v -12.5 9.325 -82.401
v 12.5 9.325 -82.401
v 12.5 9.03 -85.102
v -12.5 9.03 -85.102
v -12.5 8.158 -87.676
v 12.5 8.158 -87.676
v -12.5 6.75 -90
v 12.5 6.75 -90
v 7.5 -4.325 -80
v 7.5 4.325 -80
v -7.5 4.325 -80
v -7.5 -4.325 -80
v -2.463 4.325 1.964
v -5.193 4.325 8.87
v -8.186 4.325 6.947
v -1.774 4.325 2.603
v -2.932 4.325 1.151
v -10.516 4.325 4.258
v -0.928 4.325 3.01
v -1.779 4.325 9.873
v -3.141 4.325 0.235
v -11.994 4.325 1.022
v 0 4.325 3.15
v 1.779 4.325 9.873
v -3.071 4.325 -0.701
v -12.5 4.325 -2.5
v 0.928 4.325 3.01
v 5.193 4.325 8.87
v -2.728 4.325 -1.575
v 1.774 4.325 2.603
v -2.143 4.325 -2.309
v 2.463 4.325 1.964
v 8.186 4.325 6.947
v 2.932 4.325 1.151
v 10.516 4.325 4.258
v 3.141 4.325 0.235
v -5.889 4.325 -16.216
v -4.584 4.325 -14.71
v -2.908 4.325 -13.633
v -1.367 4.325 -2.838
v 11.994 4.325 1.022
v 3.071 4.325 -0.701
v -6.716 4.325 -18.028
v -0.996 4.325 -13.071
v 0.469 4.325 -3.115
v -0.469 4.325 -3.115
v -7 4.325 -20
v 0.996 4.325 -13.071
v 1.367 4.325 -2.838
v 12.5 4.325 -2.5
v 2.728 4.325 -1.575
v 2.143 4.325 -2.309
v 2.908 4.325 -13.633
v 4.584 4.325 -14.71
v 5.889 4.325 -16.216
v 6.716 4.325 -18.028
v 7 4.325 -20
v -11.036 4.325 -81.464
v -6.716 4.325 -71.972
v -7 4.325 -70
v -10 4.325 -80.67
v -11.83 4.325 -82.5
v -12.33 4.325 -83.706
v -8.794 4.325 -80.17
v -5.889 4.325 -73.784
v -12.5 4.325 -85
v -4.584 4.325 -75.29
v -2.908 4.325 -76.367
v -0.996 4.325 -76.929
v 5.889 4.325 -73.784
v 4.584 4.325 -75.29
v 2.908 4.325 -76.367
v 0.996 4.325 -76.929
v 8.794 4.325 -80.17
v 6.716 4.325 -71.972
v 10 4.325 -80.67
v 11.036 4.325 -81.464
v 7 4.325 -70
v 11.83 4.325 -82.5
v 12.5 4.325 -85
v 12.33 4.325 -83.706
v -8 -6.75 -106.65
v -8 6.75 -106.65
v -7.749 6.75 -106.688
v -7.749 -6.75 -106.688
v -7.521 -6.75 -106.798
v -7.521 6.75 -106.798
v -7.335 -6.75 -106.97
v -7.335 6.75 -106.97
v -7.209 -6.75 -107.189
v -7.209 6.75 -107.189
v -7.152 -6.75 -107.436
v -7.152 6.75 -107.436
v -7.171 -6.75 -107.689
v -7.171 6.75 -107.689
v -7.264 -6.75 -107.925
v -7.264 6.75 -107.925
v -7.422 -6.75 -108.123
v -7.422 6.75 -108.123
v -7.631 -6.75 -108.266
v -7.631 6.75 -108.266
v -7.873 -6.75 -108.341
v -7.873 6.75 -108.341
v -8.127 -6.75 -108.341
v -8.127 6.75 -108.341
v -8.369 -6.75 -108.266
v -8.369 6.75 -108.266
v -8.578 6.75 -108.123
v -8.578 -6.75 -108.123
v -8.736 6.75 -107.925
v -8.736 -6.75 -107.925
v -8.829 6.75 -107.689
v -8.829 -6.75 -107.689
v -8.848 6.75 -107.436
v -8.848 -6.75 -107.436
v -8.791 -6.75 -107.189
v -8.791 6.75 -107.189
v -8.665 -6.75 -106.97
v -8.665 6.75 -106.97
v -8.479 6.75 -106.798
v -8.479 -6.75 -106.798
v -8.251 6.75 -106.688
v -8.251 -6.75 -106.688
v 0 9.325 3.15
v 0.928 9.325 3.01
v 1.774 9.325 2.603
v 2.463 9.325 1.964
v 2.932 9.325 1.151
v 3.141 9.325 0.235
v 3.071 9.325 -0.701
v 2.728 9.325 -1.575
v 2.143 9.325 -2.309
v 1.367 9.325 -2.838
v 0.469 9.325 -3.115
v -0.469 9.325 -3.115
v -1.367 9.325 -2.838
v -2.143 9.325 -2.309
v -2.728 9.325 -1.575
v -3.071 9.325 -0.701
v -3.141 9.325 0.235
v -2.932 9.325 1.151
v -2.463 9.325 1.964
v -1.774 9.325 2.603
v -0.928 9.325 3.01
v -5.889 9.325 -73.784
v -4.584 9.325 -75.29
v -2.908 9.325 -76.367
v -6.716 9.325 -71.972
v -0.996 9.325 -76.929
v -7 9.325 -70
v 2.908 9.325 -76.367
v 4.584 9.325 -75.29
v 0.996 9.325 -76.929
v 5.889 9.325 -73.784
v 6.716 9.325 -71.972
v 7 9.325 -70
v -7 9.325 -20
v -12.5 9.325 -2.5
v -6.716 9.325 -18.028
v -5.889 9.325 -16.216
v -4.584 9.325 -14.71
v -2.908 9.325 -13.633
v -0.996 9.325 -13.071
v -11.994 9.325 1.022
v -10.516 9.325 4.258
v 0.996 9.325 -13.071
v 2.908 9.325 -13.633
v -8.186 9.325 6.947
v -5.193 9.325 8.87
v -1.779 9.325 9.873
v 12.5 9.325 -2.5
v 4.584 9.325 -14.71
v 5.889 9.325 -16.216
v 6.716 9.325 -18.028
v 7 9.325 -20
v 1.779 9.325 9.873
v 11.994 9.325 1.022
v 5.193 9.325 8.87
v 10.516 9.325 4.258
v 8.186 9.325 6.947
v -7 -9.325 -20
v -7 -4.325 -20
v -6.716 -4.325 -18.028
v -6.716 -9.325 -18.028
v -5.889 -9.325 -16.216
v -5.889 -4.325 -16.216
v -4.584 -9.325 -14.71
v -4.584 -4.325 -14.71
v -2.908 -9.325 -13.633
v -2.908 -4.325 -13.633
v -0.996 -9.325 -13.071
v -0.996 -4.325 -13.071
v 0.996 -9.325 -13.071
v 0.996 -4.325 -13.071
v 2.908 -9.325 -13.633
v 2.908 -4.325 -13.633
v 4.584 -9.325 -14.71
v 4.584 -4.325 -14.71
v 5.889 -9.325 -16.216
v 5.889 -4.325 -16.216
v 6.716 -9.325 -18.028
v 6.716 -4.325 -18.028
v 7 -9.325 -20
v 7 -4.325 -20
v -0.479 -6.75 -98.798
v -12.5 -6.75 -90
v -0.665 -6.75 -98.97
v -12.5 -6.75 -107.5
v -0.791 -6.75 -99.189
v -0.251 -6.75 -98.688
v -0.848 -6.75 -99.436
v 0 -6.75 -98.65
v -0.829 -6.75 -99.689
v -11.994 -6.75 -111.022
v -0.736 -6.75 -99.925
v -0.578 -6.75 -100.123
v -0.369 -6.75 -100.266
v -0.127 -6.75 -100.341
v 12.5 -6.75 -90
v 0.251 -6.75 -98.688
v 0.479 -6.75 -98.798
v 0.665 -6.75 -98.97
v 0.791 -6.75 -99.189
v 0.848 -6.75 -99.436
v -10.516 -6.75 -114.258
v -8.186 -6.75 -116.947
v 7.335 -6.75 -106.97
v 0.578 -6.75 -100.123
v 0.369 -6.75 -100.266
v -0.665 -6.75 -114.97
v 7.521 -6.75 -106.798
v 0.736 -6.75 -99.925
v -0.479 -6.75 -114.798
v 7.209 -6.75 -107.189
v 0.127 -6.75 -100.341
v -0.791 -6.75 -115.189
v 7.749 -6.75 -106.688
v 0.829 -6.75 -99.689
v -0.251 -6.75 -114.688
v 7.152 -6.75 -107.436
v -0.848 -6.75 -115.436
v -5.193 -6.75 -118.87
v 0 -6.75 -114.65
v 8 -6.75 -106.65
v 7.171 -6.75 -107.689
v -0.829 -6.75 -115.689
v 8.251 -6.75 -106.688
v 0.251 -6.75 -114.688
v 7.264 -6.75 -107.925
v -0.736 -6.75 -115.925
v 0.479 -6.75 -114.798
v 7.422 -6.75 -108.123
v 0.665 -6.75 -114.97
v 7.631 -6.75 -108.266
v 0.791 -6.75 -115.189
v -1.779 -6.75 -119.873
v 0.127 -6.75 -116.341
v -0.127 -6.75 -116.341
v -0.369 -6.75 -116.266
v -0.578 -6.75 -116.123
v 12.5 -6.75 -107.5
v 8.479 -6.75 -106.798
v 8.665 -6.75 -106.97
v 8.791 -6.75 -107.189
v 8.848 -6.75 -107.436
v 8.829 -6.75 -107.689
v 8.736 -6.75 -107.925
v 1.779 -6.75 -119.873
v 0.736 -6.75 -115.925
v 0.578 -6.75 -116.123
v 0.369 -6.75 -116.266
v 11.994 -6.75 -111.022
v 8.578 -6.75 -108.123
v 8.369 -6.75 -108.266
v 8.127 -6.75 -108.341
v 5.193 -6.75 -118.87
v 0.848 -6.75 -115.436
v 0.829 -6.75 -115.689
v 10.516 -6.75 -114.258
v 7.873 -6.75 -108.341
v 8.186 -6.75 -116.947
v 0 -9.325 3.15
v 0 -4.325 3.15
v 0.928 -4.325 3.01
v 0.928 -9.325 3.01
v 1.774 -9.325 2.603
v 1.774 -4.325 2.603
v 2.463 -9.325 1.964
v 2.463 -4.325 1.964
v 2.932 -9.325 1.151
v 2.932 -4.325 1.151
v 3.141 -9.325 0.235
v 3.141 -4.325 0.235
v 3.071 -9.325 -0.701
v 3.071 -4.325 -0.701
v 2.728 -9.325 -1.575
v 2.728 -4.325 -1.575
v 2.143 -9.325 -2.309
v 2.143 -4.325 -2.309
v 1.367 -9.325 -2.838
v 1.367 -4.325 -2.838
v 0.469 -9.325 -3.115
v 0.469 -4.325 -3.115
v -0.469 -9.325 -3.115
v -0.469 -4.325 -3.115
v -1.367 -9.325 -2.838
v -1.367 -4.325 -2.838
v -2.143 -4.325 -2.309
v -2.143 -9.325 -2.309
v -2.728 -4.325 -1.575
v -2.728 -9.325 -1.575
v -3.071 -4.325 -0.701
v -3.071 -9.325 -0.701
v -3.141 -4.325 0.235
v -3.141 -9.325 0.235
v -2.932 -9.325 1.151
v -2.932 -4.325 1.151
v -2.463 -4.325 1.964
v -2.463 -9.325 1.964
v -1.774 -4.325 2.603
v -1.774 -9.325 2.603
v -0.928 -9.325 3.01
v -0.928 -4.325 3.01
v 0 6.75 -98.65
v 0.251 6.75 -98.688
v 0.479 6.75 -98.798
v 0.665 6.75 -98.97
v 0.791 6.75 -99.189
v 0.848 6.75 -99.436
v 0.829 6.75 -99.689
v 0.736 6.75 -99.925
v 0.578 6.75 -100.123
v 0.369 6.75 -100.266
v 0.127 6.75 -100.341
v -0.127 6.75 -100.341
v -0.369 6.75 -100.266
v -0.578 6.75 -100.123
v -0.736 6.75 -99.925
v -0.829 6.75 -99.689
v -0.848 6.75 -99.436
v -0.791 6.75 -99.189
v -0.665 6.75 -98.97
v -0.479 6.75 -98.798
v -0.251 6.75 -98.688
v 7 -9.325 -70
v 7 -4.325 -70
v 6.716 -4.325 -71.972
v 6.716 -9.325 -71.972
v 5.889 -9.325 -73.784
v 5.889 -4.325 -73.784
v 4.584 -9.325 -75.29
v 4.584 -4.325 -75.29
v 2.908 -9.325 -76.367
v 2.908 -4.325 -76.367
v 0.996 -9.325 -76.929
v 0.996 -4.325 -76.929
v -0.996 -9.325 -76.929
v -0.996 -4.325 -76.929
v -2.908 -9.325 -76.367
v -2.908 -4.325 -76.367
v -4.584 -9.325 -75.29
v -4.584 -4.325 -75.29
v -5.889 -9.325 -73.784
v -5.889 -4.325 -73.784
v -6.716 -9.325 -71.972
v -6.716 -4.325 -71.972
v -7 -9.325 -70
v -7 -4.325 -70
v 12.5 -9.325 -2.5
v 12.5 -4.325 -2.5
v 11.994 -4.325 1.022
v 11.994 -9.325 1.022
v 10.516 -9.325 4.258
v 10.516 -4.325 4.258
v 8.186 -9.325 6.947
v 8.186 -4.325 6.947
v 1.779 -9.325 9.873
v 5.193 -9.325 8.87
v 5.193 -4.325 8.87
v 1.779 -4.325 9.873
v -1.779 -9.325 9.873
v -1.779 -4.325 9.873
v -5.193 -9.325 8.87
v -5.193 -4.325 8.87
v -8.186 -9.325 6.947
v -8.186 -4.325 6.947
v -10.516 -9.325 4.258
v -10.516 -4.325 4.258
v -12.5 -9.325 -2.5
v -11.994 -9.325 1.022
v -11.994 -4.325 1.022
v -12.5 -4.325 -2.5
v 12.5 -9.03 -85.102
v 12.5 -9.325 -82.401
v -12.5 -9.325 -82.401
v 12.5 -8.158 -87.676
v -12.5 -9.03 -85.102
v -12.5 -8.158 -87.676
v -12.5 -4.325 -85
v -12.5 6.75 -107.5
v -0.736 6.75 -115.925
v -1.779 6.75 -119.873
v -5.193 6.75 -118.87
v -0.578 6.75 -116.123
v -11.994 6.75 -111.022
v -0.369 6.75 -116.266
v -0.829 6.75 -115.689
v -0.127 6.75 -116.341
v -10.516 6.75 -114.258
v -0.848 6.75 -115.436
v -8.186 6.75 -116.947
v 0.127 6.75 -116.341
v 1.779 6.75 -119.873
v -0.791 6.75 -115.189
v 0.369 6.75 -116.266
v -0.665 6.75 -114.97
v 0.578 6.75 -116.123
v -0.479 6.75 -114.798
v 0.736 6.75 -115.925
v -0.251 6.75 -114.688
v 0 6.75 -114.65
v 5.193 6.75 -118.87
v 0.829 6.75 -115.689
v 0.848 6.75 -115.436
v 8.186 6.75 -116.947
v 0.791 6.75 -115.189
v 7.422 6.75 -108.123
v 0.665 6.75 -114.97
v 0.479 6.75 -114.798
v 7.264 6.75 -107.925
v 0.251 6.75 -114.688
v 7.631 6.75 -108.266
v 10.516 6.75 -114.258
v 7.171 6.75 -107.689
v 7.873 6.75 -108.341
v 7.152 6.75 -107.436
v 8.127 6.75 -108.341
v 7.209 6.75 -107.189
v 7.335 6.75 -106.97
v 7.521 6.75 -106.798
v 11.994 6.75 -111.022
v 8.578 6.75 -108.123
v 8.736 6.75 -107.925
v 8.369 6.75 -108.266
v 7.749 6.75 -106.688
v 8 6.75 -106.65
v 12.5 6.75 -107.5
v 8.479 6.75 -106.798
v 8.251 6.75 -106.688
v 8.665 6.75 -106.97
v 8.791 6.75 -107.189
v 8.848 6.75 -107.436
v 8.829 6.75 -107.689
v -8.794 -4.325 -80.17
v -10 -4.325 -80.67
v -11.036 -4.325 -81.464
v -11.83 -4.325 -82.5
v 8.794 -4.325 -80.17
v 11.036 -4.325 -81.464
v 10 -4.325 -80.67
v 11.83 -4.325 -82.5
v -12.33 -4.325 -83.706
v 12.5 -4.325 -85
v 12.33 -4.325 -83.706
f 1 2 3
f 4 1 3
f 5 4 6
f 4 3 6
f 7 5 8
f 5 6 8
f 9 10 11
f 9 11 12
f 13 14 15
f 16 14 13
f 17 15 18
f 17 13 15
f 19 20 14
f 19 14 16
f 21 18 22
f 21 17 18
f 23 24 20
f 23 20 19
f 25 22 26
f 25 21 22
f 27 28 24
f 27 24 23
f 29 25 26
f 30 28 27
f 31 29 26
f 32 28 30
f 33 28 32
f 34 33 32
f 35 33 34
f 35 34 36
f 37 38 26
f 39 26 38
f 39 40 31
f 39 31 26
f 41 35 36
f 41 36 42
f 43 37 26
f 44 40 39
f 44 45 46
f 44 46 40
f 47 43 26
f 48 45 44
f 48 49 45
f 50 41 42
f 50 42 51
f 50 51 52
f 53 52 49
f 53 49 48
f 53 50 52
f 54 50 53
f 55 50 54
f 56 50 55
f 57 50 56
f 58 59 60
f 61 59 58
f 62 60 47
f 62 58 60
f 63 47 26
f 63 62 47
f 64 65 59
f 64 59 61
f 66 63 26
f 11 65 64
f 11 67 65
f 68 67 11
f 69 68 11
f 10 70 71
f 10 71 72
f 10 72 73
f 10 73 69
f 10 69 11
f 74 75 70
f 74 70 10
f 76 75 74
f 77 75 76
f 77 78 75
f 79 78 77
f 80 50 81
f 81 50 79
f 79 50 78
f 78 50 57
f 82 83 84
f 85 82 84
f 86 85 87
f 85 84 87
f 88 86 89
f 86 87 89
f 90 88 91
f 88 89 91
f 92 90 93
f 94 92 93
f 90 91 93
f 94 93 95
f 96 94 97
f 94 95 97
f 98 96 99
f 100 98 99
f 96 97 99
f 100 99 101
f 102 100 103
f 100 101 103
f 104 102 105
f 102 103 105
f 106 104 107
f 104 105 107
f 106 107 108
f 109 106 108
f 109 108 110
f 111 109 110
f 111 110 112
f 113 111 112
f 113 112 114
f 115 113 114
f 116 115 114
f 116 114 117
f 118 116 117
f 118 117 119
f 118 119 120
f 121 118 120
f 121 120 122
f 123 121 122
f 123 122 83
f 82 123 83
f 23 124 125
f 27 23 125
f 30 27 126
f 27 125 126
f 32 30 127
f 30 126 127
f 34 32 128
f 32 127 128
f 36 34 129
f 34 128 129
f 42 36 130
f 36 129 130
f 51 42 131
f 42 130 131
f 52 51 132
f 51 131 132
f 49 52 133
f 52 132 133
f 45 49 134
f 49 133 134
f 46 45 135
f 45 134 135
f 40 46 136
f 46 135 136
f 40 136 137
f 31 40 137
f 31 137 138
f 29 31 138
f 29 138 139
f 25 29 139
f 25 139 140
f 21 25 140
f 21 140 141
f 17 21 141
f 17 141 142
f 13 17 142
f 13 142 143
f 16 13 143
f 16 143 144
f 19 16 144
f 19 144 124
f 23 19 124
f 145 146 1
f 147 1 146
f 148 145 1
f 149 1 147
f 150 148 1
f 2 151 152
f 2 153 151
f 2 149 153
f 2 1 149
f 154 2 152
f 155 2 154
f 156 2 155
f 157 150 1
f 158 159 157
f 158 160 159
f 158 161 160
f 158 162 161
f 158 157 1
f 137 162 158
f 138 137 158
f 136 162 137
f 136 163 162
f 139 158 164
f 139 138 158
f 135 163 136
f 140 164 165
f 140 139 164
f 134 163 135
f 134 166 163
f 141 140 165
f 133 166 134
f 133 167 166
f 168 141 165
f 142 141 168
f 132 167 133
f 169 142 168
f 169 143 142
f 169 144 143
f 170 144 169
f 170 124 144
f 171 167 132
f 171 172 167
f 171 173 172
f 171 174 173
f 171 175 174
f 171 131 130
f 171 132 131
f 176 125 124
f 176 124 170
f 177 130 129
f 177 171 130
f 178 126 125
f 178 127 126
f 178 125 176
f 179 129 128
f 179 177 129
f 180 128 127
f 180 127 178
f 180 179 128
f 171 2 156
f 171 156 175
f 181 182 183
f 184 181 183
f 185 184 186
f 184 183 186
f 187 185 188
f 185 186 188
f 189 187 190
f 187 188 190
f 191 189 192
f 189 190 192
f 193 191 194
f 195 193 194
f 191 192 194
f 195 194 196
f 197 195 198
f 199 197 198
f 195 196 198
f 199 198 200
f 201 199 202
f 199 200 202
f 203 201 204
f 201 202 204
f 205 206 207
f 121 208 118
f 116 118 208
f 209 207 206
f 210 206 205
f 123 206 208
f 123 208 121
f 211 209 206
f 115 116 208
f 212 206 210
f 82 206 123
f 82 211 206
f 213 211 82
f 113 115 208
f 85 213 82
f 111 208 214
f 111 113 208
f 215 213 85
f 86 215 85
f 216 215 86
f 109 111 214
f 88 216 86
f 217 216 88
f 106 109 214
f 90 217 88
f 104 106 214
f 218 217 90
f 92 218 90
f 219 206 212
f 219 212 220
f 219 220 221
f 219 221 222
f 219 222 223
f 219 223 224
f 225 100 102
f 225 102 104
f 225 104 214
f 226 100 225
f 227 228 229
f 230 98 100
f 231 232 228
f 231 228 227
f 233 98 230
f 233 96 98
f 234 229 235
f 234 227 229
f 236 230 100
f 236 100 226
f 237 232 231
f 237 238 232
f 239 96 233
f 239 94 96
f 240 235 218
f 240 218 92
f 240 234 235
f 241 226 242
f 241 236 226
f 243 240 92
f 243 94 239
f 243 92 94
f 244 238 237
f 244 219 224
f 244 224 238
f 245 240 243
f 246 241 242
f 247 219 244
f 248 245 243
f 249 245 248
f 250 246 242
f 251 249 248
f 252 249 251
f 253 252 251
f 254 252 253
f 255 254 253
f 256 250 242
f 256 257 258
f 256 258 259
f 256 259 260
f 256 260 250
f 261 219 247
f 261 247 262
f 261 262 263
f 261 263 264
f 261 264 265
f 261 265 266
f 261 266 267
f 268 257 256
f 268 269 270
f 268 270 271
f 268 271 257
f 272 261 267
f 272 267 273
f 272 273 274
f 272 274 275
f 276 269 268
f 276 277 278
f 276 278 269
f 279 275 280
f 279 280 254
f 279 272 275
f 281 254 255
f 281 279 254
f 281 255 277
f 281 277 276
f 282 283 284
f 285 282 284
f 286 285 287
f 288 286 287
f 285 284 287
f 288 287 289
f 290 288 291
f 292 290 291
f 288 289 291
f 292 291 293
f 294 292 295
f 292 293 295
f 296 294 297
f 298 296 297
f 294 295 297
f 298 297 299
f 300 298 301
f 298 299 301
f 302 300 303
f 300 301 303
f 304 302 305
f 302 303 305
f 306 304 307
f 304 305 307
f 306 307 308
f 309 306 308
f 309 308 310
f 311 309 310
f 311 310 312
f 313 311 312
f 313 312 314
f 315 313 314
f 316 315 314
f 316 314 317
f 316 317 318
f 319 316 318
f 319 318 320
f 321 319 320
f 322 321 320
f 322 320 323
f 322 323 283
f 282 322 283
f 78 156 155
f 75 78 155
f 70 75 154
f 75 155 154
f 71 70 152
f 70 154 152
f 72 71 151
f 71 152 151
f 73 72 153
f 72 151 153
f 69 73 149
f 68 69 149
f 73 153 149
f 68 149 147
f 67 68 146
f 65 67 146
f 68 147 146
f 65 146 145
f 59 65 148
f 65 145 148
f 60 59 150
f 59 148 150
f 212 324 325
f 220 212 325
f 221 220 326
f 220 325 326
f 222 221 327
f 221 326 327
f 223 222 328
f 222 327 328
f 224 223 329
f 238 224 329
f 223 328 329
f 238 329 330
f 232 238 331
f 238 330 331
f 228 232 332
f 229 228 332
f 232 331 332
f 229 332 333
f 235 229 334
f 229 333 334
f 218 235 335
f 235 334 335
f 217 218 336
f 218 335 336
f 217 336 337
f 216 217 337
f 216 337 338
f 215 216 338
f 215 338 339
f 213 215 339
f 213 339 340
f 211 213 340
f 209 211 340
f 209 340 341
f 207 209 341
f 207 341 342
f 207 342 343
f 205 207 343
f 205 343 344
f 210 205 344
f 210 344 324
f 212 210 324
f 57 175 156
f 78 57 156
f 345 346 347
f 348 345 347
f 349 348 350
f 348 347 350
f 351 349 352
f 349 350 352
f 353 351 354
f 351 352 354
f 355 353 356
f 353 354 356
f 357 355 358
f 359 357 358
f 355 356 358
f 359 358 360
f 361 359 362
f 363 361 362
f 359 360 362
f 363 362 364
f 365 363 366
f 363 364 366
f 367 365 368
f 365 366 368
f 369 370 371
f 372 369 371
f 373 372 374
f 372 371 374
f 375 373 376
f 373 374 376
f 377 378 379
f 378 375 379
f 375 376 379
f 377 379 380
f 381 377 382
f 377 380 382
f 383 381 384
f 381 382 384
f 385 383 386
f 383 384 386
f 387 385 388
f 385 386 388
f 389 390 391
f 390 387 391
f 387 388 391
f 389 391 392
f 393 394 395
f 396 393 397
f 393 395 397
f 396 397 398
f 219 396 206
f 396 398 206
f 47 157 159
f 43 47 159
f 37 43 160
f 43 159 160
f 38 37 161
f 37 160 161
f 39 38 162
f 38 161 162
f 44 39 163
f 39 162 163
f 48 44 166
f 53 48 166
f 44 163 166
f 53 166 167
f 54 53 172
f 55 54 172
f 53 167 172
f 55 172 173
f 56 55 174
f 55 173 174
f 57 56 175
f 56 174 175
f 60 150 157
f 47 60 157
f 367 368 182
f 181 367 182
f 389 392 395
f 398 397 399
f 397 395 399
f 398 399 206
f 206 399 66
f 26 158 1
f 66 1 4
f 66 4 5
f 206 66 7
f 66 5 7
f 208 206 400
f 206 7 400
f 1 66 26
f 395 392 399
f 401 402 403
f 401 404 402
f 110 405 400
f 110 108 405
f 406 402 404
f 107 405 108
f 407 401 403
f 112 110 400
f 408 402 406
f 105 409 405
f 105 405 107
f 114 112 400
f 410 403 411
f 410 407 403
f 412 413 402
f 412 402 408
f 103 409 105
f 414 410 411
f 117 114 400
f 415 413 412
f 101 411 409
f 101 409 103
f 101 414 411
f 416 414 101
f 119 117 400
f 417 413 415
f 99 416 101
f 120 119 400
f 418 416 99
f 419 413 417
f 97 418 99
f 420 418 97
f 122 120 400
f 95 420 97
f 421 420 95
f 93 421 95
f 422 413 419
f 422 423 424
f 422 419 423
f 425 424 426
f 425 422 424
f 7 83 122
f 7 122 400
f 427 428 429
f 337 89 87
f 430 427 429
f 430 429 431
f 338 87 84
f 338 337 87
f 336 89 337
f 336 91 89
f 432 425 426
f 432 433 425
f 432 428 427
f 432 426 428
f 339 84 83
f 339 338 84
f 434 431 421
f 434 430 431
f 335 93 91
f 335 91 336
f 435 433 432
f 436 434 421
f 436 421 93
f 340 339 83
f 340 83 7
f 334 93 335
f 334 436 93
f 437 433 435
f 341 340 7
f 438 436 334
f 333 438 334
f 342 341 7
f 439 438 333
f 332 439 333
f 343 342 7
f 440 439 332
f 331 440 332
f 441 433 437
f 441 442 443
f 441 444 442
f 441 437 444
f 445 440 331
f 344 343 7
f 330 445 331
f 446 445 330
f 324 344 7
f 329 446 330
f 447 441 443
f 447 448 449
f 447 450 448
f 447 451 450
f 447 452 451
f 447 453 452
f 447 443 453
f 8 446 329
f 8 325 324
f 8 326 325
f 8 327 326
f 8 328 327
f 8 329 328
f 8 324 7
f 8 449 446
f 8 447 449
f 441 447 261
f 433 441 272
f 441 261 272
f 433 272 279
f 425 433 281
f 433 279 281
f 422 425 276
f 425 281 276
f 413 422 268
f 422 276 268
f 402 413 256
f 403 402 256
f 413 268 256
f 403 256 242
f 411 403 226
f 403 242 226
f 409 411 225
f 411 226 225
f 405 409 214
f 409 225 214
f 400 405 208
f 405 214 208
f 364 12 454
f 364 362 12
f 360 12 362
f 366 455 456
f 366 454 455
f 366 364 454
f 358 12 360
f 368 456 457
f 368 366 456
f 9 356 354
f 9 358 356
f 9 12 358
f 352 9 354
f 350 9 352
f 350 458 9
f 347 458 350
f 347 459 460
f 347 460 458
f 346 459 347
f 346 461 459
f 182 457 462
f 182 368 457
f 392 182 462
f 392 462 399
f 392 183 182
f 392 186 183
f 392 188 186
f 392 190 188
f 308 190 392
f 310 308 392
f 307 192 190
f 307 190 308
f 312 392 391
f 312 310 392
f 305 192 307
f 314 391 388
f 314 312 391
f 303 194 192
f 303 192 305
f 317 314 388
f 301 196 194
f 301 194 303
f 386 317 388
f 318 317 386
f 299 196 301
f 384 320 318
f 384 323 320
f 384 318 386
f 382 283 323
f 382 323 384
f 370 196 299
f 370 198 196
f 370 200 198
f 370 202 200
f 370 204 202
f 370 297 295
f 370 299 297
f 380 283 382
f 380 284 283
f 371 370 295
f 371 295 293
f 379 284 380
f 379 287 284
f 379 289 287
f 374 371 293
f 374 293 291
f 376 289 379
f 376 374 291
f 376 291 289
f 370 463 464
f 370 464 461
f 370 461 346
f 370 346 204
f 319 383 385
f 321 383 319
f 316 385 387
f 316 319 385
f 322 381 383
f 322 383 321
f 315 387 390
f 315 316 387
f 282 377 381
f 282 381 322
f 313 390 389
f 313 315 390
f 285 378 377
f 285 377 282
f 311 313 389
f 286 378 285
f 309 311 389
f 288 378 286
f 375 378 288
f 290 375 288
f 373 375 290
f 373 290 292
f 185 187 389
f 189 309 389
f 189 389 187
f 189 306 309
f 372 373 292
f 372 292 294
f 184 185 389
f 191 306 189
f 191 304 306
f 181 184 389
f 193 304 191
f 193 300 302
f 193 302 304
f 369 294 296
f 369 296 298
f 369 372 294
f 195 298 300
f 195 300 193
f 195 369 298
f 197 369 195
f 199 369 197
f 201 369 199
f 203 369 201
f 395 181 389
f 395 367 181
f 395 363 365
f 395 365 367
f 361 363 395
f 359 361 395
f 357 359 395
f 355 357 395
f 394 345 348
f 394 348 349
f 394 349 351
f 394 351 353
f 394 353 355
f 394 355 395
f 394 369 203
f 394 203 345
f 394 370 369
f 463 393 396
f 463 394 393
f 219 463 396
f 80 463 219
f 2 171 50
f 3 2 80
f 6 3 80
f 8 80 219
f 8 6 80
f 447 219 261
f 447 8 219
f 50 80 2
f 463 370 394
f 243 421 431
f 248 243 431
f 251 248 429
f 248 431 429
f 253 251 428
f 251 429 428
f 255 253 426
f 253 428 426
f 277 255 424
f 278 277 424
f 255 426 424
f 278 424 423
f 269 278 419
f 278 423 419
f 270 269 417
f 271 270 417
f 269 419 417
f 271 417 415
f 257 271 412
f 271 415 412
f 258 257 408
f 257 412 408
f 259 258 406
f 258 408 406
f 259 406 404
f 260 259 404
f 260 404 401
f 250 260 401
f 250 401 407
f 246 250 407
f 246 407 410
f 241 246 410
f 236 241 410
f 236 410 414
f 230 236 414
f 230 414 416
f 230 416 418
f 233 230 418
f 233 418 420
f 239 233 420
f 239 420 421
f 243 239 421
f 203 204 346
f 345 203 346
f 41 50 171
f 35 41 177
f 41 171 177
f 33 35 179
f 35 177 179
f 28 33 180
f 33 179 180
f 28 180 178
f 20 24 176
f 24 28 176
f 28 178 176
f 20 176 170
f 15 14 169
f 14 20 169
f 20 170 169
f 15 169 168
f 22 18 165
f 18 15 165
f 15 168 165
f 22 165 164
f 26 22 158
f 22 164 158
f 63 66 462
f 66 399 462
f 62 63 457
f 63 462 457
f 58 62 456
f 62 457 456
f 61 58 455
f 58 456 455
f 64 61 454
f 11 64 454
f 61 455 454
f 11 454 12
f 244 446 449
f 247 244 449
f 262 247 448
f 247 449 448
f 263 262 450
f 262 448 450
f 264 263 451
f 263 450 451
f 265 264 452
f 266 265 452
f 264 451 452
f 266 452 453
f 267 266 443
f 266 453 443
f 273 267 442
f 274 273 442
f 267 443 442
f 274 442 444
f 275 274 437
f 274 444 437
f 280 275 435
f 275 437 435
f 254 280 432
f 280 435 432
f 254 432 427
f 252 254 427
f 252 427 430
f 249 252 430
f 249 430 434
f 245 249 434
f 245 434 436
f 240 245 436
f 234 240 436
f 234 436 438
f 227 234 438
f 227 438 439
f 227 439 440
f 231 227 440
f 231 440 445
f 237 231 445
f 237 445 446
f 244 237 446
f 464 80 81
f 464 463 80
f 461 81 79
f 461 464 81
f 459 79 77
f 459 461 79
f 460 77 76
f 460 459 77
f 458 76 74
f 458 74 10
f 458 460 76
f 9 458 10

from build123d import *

# Parameters (mm, degrees)
BOSS_EXTRU_1_DEPTH      = 12.5
CONG_1_R                = 12.5
ESQUISSE2_R             = 0.85
ENL_V_MAT_EXTRU_1_DEPTH = 122.715469949
ESQUISSE3_R             = 3.15
ENL_V_MAT_EXTRU_2_DEPTH = 123.082236628
ENL_V_MAT_EXTRU_3_DEPTH = 123.082236628
CONG_2_R                = 5


with BuildPart() as part:
    # Esquisse1 → Boss.-Extru.1 (new, symmetric)
    with BuildSketch(Plane(origin=(0, 0, 0), x_dir=(0, 0, -1), z_dir=(1, 0, 0))):
        Polygon((90, 9.325), (-10, 9.325), (-10, 4.325), (80, 4.325), (80, -4.325), (-10, -4.325), (-10, -9.325), (90, -9.325), (90, -6.75), (120, -6.75), (120, 6.75), (90, 6.75), align=None)
    extrude(amount=BOSS_EXTRU_1_DEPTH, both=True)

    # Congé1
    # the kernel refuses this fillet: 12.5 mm, written as the material it takes off along each edge
    with BuildSketch(Plane(origin=(-31.497429925, -9.325, -90), x_dir=(0, 1, 0), z_dir=(1, 0, 0))) as cong_1_piece_1:
        with BuildLine():
            CenterArc((12.5, 7.59897197), CONG_1_R, 180, 37.439095089)
            Line((0, 7.59897197), (-0.25, 7.59897197))
            Line((-0.25, 7.59897197), (-0.25, 0))
            Line((-0.25, 0), (0, -0.25))
            ThreePointArc((0, -0.25), (1.2875, -0.25), (2.3765, -0.151979439))
            Line((2.3765, -0.151979439), (2.575, 0))
        make_face()
    extrude(amount=62.99485985, mode=Mode.SUBTRACT)
    with BuildSketch(Plane(origin=(31.497429925, 9.325, -90), x_dir=(0, 0, 1), z_dir=(-1, 0, 0))) as cong_1_piece_2:
        with BuildLine():
            CenterArc((7.59897197, -12.5), CONG_1_R, 90, 37.439095089)
            Line((0, -2.575), (-0.151979439, -2.3765))
            ThreePointArc((-0.151979439, -2.3765), (-0.25, -1.2875), (-0.25, 0))
            Line((-0.25, 0), (0, 0.25))
            Line((0, 0.25), (7.59897197, 0.25))
            Line((7.59897197, 0.25), (7.59897197, 0))
        make_face()
    extrude(amount=62.99485985, mode=Mode.SUBTRACT)
    with BuildSketch(Plane(origin=(-12.5, 26.925, 10), x_dir=(1, 0, 0), z_dir=(0, -1, 0)), Plane(origin=(-12.5, 40.575, 10), x_dir=(1, 0, 0), z_dir=(0, -1, 0)), Plane(origin=(12.5, 40.575, 10), x_dir=(0, 0, -1), z_dir=(0, -1, 0))) as cong_1_piece_3:
        with BuildLine():
            CenterArc((CONG_1_R, -CONG_1_R), CONG_1_R, 90, 90)
            Line((0, -CONG_1_R), (-CONG_1_R * 0.02, -CONG_1_R))
            Line((-CONG_1_R * 0.02, -CONG_1_R), (-CONG_1_R * 0.02, CONG_1_R * 0.02))
            Line((-CONG_1_R * 0.02, CONG_1_R * 0.02), (CONG_1_R, CONG_1_R * 0.02))
            Line((CONG_1_R, CONG_1_R * 0.02), (CONG_1_R, 0))
        make_face()
    extrude(amount=67.5, mode=Mode.SUBTRACT)
    with BuildSketch(Plane(origin=(12.5, 26.925, 10), x_dir=(-1, 0, 0), z_dir=(0, -1, 0))) as cong_1_piece_4:
        with BuildLine():
            CenterArc((CONG_1_R, CONG_1_R), CONG_1_R, 180, 90)
            Line((0, CONG_1_R), (-CONG_1_R * 0.02, CONG_1_R))
            Line((-CONG_1_R * 0.02, CONG_1_R), (-CONG_1_R * 0.02, -CONG_1_R * 0.02))
            Line((-CONG_1_R * 0.02, -CONG_1_R * 0.02), (CONG_1_R, -CONG_1_R * 0.02))
            Line((CONG_1_R, -CONG_1_R * 0.02), (CONG_1_R, 0))
        make_face()
    extrude(amount=67.5, mode=Mode.SUBTRACT)
    with BuildSketch(Plane(origin=(-12.5, -38, -120), x_dir=(1, 0, 0), z_dir=(0, 1, 0))) as cong_1_piece_5:
        with BuildLine():
            CenterArc((CONG_1_R, -CONG_1_R), CONG_1_R, 90, 90)
            Line((0, -CONG_1_R), (-CONG_1_R * 0.02, -CONG_1_R))
            Line((-CONG_1_R * 0.02, -CONG_1_R), (-CONG_1_R * 0.02, CONG_1_R * 0.02))
            Line((-CONG_1_R * 0.02, CONG_1_R * 0.02), (CONG_1_R, CONG_1_R * 0.02))
            Line((CONG_1_R, CONG_1_R * 0.02), (CONG_1_R, 0))
        make_face()
    extrude(amount=76, mode=Mode.SUBTRACT)
    with BuildSketch(Plane(origin=(12.5, -38, -120), x_dir=(-1, 0, 0), z_dir=(0, 1, 0))) as cong_1_piece_6:
        with BuildLine():
            CenterArc((CONG_1_R, CONG_1_R), CONG_1_R, 180, 90)
            Line((0, CONG_1_R), (-CONG_1_R * 0.02, CONG_1_R))
            Line((-CONG_1_R * 0.02, CONG_1_R), (-CONG_1_R * 0.02, -CONG_1_R * 0.02))
            Line((-CONG_1_R * 0.02, -CONG_1_R * 0.02), (CONG_1_R, -CONG_1_R * 0.02))
            Line((CONG_1_R, -CONG_1_R * 0.02), (CONG_1_R, 0))
        make_face()
    extrude(amount=76, mode=Mode.SUBTRACT)

    # Esquisse2 → Enlèv. mat.-Extru.1 (cut, through all)
    with BuildSketch(Plane(origin=(0, 6.75, 0), x_dir=(1, 0, 0), z_dir=(0, 1, 0))):
        with Locations(Location((8, 107.5, 0), (0, 0, 270))):
            Circle(ESQUISSE2_R)
        with Locations(Location((0, 115.5, 0), (0, 0, 270))):
            Circle(ESQUISSE2_R)
        with Locations(Location((-8, 107.5, 0), (0, 0, 270))):
            Circle(ESQUISSE2_R)
        with Locations(Location((0, 99.5, 0), (0, 0, 270))):
            Circle(ESQUISSE2_R)
    extrude(amount=-ENL_V_MAT_EXTRU_1_DEPTH, mode=Mode.SUBTRACT)

    # Esquisse3 → Enlèv. mat.-Extru.2 (cut, through all)
    with BuildSketch(Plane(origin=(0, 9.325, 0), x_dir=(1, 0, 0), z_dir=(0, 1, 0))):
        with Locations(Location((0, 0, 0), (0, 0, 270))):
            Circle(ESQUISSE3_R)
    extrude(amount=-ENL_V_MAT_EXTRU_2_DEPTH, mode=Mode.SUBTRACT)

    # Esquisse4 → Enlèv. mat.-Extru.3 (cut, through all)
    with BuildSketch(Plane(origin=(0, 9.325, 0), x_dir=(1, 0, 0), z_dir=(0, 1, 0))):
        with BuildLine():
            Line((-7, 70), (-7, 20))
            ThreePointArc((-7, 20), (0, 13), (7, 20))
            Line((7, 20), (7, 70))
            ThreePointArc((7, 70), (0, 77), (-7, 70))
        make_face()
    extrude(amount=-ENL_V_MAT_EXTRU_3_DEPTH, mode=Mode.SUBTRACT)

    # Congé2
    cong_2_edges = [part.edges().sort_by_distance(p)[0] for p in [
        (12.5, 0, -80),
        (-12.5, 0, -80),
    ]]
    fillet(cong_2_edges, radius=CONG_2_R)


solid = part.part
